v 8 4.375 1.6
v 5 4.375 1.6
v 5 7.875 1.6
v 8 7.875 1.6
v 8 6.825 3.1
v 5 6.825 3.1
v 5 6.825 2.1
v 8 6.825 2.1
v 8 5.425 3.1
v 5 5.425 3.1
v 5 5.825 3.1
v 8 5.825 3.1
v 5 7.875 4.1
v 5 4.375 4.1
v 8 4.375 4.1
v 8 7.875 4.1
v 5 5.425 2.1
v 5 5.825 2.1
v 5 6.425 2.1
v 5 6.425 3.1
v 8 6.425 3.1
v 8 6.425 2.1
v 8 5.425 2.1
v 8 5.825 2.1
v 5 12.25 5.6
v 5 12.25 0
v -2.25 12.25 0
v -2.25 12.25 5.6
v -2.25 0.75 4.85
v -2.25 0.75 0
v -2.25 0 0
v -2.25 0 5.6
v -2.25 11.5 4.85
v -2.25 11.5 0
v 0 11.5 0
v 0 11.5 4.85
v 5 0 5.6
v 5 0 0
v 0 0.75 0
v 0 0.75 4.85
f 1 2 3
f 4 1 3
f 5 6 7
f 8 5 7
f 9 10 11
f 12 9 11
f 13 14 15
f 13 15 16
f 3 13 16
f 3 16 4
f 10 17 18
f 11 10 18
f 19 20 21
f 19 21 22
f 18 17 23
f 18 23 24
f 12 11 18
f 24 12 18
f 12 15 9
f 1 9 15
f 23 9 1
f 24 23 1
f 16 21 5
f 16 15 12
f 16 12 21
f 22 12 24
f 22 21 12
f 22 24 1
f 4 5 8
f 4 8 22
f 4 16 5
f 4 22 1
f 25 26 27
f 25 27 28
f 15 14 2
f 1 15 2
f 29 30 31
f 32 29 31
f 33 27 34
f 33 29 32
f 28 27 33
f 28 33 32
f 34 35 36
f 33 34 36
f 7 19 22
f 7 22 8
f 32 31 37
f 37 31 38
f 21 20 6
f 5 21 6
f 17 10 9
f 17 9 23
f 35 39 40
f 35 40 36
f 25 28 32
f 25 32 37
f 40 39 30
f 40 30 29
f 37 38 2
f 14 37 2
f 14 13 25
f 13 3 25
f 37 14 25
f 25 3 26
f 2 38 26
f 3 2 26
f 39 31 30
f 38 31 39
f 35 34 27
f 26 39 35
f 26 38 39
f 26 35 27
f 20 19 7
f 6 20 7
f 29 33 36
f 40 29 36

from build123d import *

# Parameters (mm, degrees)
SKETCH1_W           = 5
SKETCH1_H           = 12.25
BOSS_EXTRUDE1_DEPTH = 5.6
SKETCH3_W           = 2.5
SKETCH3_H           = 3.5
SKETCH3_W_2         = 1
SKETCH3_H_2         = 0.4
BOSS_EXTRUDE2_DEPTH = 3
SKETCH4_W           = 5.6
SKETCH4_H           = 0.75
BOSS_EXTRUDE3_DEPTH = 2.25
SKETCH5_W           = 2.25
SKETCH5_H           = 0.75
BOSS_EXTRUDE4_DEPTH = 10.75


with BuildPart() as part:
    # Sketch1 → Boss-Extrude1 (new body)
    with BuildSketch(Plane.XY):
        with Locations((2.5, 6.125)):
            Rectangle(SKETCH1_W, SKETCH1_H)
    extrude(amount=BOSS_EXTRUDE1_DEPTH)

    # Sketch3 → Boss-Extrude2 (add)
    with BuildSketch(Plane(origin=(5, 0, 0), x_dir=(0, 0, -1), z_dir=(1, 0, 0))):
        with Locations((-2.85, 6.125)):
            Rectangle(SKETCH3_W, SKETCH3_H)
        with Locations((-2.6, 6.625)):
            Rectangle(SKETCH3_W_2, SKETCH3_H_2, mode=Mode.SUBTRACT)
        with Locations((-2.6, 5.625)):
            Rectangle(SKETCH3_W_2, SKETCH3_H_2, mode=Mode.SUBTRACT)
    extrude(amount=BOSS_EXTRUDE2_DEPTH)

    # Sketch4 → Boss-Extrude3 (add)
    with BuildSketch(Plane.ZY):
        with Locations((2.8, 11.875)):
            Rectangle(SKETCH4_W, SKETCH4_H)
        with Locations((2.8, 0.375)):
            Rectangle(SKETCH4_W, SKETCH4_H)
    extrude(amount=BOSS_EXTRUDE3_DEPTH)

    # Sketch5 → Boss-Extrude4 (add)
    with BuildSketch(Plane.XZ.offset(-11.5)):
        with Locations((-1.125, 5.225)):
            Rectangle(SKETCH5_W, SKETCH5_H)
    extrude(amount=BOSS_EXTRUDE4_DEPTH)


solid = part.part
